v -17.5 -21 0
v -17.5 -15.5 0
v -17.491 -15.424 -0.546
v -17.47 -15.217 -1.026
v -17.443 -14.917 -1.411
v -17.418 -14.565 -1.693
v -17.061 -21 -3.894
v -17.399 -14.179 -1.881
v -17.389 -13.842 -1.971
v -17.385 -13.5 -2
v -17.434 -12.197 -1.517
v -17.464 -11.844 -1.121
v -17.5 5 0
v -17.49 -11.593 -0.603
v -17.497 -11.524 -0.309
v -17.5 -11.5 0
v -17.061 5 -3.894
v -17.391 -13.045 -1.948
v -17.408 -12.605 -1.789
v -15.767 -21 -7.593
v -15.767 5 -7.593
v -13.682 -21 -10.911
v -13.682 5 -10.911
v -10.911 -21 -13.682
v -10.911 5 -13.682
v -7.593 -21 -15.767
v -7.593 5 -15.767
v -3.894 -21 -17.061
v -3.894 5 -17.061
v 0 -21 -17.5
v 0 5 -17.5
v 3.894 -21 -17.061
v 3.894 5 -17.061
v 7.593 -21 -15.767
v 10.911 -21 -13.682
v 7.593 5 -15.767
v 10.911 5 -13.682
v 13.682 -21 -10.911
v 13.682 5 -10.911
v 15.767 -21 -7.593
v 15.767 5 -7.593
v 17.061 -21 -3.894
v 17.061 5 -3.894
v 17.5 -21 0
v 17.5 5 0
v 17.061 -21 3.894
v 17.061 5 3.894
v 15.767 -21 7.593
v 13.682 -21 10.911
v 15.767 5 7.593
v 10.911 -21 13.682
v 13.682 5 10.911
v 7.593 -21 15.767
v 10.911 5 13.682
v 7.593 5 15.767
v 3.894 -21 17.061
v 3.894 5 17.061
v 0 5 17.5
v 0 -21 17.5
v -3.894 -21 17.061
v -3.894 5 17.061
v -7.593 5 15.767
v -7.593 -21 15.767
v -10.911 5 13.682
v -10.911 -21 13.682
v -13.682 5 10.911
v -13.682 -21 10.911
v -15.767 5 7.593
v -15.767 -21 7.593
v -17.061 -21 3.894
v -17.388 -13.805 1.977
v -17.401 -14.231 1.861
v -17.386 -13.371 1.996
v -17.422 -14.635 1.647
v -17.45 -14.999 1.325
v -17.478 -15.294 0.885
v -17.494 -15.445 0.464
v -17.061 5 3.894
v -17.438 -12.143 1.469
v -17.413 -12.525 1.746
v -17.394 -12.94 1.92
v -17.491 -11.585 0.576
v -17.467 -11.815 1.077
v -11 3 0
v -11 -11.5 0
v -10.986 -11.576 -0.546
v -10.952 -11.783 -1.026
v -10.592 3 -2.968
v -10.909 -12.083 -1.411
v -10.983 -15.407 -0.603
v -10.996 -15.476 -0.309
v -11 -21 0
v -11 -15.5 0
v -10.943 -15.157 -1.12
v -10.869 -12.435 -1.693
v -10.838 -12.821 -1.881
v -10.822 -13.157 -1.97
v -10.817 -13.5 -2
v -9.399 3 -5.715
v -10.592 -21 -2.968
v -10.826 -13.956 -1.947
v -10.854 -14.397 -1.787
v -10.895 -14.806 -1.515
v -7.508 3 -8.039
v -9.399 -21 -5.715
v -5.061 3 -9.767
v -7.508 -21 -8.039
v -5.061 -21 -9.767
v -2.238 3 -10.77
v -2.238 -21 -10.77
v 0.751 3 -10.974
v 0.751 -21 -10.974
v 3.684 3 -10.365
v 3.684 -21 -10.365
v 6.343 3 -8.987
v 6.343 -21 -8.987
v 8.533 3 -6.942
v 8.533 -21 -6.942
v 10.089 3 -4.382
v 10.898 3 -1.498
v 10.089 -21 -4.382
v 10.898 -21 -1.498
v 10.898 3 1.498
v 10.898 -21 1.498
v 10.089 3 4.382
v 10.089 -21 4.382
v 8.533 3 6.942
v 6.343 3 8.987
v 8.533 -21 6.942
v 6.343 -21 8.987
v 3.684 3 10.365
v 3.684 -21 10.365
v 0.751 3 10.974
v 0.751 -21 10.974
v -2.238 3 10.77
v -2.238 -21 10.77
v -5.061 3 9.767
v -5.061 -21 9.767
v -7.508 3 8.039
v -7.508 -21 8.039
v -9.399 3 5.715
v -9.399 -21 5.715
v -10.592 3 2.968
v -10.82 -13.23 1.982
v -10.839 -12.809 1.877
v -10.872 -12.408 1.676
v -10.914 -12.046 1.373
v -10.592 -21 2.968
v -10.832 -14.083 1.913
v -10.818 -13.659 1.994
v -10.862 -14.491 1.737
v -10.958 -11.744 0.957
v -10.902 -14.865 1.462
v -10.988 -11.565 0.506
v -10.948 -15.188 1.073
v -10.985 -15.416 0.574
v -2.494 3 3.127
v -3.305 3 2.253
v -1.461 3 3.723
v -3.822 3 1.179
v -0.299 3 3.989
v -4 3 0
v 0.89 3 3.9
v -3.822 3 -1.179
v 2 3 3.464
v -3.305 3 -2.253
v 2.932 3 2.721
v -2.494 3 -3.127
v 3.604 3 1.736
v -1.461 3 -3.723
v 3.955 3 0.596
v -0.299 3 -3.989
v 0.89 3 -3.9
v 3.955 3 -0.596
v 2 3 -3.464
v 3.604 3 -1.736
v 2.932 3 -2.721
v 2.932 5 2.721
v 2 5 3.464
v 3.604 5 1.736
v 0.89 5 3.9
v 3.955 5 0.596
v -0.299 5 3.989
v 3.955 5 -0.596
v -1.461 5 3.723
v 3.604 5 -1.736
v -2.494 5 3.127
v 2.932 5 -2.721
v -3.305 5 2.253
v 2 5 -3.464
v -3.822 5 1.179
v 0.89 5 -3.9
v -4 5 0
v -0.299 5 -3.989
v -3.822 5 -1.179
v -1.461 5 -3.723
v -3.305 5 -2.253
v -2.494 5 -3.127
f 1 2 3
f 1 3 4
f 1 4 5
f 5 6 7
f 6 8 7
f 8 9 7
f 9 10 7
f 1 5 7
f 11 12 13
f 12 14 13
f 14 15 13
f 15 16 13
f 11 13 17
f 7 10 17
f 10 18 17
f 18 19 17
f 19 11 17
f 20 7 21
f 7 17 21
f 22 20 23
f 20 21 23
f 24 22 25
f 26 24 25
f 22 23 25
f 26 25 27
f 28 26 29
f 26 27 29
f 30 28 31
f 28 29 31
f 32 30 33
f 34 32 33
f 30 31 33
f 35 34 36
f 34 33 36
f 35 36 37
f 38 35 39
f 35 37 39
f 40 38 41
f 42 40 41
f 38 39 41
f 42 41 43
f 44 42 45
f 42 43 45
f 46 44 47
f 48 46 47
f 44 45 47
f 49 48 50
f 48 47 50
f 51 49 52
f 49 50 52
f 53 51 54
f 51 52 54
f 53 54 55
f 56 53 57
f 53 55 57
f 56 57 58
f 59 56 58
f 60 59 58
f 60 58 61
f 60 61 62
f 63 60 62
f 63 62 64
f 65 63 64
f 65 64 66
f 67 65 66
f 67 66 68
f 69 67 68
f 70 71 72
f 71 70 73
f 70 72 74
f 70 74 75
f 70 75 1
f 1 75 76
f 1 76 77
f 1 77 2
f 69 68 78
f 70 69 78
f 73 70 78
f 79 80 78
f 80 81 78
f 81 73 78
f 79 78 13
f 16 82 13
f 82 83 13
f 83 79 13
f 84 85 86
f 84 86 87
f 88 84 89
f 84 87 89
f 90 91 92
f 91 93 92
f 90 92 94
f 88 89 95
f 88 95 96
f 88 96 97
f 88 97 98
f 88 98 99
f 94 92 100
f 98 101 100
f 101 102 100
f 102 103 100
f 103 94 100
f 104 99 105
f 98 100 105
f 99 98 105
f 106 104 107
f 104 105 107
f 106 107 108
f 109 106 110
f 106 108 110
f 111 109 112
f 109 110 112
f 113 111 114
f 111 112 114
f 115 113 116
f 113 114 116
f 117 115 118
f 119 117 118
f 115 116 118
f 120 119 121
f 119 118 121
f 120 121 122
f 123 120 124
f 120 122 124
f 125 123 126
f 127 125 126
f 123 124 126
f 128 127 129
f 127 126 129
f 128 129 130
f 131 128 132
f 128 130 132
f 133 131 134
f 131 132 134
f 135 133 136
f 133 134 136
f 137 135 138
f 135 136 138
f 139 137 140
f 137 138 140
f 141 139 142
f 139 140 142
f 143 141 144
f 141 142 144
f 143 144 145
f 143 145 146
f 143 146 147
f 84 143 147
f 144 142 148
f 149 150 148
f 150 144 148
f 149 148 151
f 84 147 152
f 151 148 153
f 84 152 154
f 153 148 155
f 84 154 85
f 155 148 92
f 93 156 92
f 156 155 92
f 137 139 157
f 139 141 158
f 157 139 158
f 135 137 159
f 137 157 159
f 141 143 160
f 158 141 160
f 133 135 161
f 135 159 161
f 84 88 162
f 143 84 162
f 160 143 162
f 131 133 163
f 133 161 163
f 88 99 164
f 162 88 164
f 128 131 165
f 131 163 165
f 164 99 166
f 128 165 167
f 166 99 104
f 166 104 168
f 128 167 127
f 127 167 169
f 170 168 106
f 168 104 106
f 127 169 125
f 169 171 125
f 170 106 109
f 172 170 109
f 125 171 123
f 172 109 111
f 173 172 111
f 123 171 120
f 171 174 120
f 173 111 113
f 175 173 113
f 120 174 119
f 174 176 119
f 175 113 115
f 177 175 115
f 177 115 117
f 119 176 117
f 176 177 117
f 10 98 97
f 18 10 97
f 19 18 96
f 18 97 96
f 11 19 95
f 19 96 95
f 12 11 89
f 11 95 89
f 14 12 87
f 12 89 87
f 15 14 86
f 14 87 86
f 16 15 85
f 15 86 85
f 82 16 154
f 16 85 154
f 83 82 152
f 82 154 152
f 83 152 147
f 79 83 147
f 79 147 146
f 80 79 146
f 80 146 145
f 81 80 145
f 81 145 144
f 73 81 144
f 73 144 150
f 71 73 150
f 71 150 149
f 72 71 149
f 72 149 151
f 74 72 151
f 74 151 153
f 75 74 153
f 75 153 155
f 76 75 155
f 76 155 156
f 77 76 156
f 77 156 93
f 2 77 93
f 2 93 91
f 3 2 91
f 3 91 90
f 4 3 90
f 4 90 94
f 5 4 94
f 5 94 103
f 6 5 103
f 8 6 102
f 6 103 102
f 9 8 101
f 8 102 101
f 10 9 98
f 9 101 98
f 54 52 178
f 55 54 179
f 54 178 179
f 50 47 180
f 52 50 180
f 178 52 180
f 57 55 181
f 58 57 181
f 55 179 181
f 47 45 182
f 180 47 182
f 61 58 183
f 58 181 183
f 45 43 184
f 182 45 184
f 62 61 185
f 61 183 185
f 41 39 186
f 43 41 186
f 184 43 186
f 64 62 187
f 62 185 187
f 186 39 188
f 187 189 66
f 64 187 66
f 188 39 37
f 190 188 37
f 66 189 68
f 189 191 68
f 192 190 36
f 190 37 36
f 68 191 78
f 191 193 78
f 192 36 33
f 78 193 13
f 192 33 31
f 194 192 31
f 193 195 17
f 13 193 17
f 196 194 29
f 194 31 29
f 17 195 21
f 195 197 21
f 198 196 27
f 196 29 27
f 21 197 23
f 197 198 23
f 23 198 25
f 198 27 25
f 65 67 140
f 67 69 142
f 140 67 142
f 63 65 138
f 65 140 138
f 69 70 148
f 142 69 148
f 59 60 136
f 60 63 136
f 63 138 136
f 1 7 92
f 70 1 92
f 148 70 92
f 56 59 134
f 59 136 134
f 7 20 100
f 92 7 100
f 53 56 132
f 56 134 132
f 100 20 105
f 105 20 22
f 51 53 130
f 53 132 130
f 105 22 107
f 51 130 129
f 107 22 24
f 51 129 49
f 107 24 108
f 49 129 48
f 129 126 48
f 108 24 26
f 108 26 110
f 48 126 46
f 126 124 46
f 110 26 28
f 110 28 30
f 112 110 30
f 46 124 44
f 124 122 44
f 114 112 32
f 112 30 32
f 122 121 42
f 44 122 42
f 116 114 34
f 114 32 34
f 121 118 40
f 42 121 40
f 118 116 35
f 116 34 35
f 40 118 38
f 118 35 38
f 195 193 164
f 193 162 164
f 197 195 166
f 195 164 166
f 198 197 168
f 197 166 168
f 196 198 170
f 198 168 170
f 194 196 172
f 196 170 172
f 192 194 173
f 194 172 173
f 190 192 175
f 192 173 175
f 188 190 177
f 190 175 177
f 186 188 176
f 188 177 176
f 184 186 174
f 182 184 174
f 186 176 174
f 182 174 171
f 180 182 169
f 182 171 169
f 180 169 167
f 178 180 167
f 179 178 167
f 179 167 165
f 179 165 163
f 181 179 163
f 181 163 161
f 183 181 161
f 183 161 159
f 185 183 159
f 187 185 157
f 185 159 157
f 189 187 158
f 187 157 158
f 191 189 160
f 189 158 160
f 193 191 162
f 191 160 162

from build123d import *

# Parameters (mm, degrees)
EXTRUSION1_REACH = 19.5
ESQUISSE2_R      = 2


with BuildPart() as part:
    # Esquisse1 → Révolution1 (revolve)
    with BuildSketch(Plane.XY):
        Polygon((-17.5, 5), (-4, 5), (-4, 3), (-11, 3), (-11, -21), (-17.5, -21), align=None)
    revolve(axis=Axis((0, 0, 0), (0, -1, 0)))

    # Esquisse2 → Extrusion1 (cut, up to next)
    with BuildSketch(Plane(origin=(0, 0, 0), x_dir=(0, 0, -1), z_dir=(1, 0, 0)), mode=Mode.PRIVATE) as extrusion1_sk1:
        with Locations((0, -13.5)):
            Circle(ESQUISSE2_R)
    extrusion1_tool1 = extrude(extrusion1_sk1.sketch, amount=-EXTRUSION1_REACH, mode=Mode.PRIVATE) & part.part
    add(extrusion1_tool1.solids().sort_by_distance((0, -13.5, 0))[0], mode=Mode.SUBTRACT)


solid = part.part
